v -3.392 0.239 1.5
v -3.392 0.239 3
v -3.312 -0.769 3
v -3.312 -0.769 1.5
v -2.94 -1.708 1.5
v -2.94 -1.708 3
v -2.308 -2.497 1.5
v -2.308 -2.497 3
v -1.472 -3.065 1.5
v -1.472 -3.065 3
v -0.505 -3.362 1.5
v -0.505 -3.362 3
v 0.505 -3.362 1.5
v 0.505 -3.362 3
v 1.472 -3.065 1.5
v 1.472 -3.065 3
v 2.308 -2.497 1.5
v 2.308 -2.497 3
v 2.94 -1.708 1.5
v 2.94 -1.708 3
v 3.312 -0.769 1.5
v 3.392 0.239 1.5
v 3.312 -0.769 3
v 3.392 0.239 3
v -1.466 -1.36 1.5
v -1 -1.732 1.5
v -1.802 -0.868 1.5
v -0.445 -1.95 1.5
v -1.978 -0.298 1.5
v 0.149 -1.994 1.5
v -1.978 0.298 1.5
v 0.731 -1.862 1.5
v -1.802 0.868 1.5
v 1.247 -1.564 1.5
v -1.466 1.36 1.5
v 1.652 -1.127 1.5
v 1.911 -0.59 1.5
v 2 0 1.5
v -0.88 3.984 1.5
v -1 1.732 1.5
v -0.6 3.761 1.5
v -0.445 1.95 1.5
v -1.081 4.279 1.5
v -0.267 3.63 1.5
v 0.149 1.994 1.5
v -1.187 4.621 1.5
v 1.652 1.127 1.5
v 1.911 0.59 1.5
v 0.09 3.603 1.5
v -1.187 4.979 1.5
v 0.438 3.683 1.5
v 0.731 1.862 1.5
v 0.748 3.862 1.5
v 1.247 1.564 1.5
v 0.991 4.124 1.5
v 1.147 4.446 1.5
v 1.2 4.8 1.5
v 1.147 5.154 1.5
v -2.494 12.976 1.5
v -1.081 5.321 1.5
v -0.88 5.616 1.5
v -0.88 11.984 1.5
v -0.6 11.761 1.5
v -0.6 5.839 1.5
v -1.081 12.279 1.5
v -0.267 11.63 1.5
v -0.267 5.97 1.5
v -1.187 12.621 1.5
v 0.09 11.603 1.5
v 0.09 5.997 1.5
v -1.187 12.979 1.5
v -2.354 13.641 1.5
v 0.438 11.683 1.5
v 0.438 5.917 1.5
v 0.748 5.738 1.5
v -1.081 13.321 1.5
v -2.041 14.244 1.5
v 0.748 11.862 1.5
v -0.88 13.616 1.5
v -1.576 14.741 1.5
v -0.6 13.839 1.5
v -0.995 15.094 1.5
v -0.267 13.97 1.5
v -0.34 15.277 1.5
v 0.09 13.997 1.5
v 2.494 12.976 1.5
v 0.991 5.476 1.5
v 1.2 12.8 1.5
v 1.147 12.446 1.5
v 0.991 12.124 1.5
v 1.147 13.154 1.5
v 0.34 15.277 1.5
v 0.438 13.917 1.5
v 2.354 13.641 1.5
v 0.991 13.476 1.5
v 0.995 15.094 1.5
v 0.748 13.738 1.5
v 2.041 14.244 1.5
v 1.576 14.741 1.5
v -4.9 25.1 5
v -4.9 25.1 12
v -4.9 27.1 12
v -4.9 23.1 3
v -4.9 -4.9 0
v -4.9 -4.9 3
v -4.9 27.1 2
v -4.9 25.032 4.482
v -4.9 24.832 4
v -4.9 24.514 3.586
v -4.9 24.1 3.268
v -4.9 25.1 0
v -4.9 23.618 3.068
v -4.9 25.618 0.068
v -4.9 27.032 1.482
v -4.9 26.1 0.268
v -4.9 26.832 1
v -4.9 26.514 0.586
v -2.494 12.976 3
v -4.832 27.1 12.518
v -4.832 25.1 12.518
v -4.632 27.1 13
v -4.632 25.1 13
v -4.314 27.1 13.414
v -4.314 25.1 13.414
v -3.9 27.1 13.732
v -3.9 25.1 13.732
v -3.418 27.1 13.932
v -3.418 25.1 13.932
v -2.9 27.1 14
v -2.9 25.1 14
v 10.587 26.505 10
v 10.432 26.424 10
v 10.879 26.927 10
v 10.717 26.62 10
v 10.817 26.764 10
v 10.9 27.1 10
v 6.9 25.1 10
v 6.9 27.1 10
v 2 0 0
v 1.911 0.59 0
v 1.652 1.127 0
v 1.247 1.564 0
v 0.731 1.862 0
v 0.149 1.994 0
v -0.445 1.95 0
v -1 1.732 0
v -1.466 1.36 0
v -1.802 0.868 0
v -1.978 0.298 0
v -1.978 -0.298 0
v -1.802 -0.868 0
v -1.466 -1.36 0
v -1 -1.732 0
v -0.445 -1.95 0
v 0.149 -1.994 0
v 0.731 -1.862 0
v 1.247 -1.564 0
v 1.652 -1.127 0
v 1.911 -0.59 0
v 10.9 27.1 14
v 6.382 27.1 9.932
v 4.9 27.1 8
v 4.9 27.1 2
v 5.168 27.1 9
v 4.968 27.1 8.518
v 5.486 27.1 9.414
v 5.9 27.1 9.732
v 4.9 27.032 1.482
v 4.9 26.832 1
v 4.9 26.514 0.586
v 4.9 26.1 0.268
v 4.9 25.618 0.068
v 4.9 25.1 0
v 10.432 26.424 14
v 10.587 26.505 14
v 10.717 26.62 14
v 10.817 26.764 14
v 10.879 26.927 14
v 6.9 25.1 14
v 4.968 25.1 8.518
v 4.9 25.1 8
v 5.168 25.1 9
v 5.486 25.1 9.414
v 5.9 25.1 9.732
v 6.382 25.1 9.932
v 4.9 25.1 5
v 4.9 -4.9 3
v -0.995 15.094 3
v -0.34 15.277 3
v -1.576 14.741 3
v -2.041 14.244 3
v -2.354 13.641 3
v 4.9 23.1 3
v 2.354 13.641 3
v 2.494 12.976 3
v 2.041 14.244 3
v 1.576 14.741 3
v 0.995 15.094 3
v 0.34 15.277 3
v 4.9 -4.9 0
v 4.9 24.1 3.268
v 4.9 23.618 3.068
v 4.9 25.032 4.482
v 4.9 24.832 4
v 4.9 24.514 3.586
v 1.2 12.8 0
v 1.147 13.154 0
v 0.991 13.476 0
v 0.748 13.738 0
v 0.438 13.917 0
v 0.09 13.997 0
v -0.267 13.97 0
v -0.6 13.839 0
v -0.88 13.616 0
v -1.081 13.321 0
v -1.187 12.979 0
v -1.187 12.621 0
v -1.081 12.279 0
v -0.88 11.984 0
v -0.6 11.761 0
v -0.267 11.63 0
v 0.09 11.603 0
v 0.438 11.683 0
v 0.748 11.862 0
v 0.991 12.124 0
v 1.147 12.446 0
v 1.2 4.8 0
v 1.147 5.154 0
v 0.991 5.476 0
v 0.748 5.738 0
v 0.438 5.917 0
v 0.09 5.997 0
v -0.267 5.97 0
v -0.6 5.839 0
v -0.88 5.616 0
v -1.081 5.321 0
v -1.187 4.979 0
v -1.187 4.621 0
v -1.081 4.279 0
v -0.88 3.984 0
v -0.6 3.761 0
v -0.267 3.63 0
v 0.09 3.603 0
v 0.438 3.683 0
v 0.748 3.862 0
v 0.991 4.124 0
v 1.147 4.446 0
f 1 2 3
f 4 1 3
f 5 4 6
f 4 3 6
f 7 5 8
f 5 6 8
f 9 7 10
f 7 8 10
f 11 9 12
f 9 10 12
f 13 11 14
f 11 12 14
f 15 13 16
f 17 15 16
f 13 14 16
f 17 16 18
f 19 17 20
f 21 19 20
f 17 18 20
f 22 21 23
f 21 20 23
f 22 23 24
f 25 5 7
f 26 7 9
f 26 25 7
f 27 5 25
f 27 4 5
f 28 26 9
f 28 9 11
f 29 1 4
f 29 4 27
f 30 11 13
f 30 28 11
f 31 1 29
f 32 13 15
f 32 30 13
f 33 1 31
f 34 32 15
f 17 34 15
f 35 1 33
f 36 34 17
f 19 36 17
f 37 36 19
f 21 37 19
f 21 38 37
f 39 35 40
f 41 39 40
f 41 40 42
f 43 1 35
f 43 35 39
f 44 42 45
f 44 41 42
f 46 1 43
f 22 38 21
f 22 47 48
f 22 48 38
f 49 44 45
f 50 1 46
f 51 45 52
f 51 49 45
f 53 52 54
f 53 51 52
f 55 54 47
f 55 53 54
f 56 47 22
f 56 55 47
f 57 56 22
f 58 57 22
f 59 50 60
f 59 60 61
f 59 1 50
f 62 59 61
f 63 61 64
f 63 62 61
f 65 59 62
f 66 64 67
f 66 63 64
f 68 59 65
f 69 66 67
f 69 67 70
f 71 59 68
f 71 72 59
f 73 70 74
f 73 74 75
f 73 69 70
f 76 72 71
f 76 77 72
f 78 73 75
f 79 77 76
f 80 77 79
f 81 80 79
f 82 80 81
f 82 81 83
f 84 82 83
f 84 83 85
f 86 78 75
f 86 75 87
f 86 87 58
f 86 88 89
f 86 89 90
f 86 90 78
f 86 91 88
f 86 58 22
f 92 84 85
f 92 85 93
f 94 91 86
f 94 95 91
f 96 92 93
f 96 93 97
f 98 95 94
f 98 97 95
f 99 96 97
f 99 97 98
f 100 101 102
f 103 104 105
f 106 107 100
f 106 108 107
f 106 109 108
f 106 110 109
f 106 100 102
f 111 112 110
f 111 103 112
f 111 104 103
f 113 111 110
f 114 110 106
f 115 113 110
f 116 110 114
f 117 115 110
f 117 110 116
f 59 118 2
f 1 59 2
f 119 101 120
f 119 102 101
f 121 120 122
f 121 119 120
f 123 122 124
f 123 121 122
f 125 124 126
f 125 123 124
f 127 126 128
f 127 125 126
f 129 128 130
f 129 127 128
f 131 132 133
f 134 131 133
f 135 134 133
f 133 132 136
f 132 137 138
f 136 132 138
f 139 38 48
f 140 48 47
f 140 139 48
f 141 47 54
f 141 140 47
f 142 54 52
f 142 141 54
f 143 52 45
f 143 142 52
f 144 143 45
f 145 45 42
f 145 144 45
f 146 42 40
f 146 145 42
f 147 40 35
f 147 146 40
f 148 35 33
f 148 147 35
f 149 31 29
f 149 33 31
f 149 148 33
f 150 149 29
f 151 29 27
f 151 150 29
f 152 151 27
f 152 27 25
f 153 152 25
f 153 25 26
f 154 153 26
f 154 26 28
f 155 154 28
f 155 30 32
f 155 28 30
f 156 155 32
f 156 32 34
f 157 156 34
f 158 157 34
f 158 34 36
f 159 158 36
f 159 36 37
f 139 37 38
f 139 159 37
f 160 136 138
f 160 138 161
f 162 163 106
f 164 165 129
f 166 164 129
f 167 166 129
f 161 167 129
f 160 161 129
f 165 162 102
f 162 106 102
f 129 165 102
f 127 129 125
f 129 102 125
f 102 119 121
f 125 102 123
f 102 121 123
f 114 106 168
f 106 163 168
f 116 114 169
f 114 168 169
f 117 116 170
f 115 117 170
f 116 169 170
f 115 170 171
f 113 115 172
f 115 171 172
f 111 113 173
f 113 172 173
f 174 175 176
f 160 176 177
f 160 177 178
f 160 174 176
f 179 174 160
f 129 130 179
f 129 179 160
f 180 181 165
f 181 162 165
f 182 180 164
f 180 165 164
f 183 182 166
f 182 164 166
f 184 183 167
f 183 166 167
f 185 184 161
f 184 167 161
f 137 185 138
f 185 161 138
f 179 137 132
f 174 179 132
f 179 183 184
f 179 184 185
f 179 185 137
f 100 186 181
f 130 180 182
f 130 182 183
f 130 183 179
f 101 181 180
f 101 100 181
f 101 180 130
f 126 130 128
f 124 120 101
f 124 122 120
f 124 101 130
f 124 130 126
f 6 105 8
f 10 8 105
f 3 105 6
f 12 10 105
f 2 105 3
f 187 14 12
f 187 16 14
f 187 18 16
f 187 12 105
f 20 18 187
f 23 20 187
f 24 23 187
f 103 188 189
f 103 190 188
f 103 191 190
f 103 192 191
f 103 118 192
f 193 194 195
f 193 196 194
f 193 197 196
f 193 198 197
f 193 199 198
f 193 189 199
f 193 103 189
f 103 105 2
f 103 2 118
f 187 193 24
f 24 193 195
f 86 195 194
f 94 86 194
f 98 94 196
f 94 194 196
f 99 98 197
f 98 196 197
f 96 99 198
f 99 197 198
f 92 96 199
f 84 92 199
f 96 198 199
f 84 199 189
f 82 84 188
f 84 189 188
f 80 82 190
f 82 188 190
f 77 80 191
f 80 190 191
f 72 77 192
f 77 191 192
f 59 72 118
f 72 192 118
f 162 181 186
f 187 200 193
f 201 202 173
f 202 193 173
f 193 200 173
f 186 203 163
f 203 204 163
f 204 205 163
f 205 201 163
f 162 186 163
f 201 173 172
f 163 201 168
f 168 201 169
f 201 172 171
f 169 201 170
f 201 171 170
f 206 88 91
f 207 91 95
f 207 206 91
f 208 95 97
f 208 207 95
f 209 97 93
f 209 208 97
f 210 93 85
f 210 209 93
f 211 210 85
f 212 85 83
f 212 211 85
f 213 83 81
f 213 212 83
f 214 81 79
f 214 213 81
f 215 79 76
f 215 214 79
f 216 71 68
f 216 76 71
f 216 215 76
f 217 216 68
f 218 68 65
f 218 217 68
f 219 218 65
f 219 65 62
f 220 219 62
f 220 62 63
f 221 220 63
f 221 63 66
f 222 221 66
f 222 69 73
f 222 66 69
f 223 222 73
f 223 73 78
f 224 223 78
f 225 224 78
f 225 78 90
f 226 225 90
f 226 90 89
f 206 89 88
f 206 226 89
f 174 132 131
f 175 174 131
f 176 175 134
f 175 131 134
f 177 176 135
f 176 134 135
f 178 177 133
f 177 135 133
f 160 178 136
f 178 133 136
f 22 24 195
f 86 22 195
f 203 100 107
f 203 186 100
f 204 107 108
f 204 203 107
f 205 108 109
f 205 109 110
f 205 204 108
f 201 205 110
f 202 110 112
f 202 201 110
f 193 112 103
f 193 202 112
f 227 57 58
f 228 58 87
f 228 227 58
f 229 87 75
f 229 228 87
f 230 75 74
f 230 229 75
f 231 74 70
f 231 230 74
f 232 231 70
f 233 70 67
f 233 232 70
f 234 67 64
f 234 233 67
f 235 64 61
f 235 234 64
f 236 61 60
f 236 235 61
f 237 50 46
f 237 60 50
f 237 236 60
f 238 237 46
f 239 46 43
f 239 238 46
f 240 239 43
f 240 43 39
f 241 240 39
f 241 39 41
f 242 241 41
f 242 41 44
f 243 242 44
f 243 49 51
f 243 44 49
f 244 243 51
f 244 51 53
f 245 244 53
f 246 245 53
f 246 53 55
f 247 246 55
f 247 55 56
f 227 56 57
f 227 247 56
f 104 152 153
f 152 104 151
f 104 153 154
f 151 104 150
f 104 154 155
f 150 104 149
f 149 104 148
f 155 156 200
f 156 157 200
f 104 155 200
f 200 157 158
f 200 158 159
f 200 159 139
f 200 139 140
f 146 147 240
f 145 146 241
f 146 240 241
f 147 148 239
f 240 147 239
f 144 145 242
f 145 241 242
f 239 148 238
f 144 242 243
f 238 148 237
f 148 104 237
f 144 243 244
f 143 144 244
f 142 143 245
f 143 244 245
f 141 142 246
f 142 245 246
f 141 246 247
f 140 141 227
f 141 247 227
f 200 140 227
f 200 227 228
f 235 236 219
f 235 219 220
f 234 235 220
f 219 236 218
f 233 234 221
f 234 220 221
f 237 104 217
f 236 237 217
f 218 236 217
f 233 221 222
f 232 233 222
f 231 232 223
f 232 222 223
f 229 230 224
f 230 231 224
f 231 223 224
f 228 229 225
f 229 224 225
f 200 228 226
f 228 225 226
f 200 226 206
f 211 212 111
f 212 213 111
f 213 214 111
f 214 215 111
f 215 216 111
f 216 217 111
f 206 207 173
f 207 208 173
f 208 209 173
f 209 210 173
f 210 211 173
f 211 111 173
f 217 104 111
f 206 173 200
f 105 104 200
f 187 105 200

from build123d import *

# Parameters (mm, degrees)
F0_W      = 9.8
F0_H      = 32
F0_R      = 2
F0_R_2    = 1.2
F1_DEPTH  = 3
F3_DEPTH  = 1.5
F4_W      = 9.8
F4_H      = 2
F5_DEPTH  = 11
F6_W      = 2
F6_H      = 4
F7_DEPTH  = 6
F8_R      = 2
F10_DEPTH = 4


with BuildPart() as f1:
    # F0 (on Top) → F1 (new body)
    with BuildSketch(Plane.XY):
        with Locations((0, 11.1)):
            Rectangle(F0_W, F0_H)
        Circle(F0_R, mode=Mode.SUBTRACT)
        with Locations((0, 4.8)):
            Circle(F0_R_2, mode=Mode.SUBTRACT)
        with Locations((0, 12.8)):
            Circle(F0_R_2, mode=Mode.SUBTRACT)
    extrude(amount=F1_DEPTH)

    # F2 (on face) → F3 (cut)
    with BuildSketch(Plane.XY.offset(3)):
        with BuildLine():
            Line((-2.493813, 12.975781), (-3.391585, 0.239062))
            ThreePointArc((-3.391585, 0.239062), (0, -3.4), (3.391585, 0.239062))
            Line((3.391585, 0.239062), (2.493813, 12.975781))
            ThreePointArc((2.493813, 12.975781), (0, 15.3), (-2.493813, 12.975781))
        make_face()
    extrude(amount=-F3_DEPTH, mode=Mode.SUBTRACT)

    # F4 (on face) → F5 (join)
    with BuildSketch(Plane.XY.offset(3)):
        with Locations((0, 26.1)):
            Rectangle(F4_W, F4_H)
    extrude(amount=F5_DEPTH)

    # F6 (on face) → F7 (join)
    with BuildSketch(Plane.YZ.offset(4.9)):
        with Locations((26.1, 12)):
            Rectangle(F6_W, F6_H)
    extrude(amount=F7_DEPTH)

    # F8
    f8_edges = [f1.edges().sort_by_distance(p)[0] for p in [
        (4.9, 26.1, 10),
        (-4.9, 26.1, 14),
        (0, 25.1, 3),
        (0, 27.1, 0),
    ]]
    fillet(f8_edges, radius=F8_R)

    # F9 (on face) → F10 (cut, through all)
    with BuildSketch(Plane(origin=(0, 0, 10), x_dir=(1, 0, 0), z_dir=(0, 0, -1))):
        with BuildLine():
            Line((10.9, -25.1), (6.9, -25.1))
            Line((6.9, -25.1), (10.431835, -26.424438))
            ThreePointArc((10.431835, -26.424438), (10.771519, -26.689037), (10.9, -27.1))
            Line((10.9, -27.1), (10.9, -26.6))
            Line((10.9, -26.6), (10.9, -25.1))
        make_face()
    extrude(amount=-F10_DEPTH, mode=Mode.SUBTRACT)


solid = f1.part
